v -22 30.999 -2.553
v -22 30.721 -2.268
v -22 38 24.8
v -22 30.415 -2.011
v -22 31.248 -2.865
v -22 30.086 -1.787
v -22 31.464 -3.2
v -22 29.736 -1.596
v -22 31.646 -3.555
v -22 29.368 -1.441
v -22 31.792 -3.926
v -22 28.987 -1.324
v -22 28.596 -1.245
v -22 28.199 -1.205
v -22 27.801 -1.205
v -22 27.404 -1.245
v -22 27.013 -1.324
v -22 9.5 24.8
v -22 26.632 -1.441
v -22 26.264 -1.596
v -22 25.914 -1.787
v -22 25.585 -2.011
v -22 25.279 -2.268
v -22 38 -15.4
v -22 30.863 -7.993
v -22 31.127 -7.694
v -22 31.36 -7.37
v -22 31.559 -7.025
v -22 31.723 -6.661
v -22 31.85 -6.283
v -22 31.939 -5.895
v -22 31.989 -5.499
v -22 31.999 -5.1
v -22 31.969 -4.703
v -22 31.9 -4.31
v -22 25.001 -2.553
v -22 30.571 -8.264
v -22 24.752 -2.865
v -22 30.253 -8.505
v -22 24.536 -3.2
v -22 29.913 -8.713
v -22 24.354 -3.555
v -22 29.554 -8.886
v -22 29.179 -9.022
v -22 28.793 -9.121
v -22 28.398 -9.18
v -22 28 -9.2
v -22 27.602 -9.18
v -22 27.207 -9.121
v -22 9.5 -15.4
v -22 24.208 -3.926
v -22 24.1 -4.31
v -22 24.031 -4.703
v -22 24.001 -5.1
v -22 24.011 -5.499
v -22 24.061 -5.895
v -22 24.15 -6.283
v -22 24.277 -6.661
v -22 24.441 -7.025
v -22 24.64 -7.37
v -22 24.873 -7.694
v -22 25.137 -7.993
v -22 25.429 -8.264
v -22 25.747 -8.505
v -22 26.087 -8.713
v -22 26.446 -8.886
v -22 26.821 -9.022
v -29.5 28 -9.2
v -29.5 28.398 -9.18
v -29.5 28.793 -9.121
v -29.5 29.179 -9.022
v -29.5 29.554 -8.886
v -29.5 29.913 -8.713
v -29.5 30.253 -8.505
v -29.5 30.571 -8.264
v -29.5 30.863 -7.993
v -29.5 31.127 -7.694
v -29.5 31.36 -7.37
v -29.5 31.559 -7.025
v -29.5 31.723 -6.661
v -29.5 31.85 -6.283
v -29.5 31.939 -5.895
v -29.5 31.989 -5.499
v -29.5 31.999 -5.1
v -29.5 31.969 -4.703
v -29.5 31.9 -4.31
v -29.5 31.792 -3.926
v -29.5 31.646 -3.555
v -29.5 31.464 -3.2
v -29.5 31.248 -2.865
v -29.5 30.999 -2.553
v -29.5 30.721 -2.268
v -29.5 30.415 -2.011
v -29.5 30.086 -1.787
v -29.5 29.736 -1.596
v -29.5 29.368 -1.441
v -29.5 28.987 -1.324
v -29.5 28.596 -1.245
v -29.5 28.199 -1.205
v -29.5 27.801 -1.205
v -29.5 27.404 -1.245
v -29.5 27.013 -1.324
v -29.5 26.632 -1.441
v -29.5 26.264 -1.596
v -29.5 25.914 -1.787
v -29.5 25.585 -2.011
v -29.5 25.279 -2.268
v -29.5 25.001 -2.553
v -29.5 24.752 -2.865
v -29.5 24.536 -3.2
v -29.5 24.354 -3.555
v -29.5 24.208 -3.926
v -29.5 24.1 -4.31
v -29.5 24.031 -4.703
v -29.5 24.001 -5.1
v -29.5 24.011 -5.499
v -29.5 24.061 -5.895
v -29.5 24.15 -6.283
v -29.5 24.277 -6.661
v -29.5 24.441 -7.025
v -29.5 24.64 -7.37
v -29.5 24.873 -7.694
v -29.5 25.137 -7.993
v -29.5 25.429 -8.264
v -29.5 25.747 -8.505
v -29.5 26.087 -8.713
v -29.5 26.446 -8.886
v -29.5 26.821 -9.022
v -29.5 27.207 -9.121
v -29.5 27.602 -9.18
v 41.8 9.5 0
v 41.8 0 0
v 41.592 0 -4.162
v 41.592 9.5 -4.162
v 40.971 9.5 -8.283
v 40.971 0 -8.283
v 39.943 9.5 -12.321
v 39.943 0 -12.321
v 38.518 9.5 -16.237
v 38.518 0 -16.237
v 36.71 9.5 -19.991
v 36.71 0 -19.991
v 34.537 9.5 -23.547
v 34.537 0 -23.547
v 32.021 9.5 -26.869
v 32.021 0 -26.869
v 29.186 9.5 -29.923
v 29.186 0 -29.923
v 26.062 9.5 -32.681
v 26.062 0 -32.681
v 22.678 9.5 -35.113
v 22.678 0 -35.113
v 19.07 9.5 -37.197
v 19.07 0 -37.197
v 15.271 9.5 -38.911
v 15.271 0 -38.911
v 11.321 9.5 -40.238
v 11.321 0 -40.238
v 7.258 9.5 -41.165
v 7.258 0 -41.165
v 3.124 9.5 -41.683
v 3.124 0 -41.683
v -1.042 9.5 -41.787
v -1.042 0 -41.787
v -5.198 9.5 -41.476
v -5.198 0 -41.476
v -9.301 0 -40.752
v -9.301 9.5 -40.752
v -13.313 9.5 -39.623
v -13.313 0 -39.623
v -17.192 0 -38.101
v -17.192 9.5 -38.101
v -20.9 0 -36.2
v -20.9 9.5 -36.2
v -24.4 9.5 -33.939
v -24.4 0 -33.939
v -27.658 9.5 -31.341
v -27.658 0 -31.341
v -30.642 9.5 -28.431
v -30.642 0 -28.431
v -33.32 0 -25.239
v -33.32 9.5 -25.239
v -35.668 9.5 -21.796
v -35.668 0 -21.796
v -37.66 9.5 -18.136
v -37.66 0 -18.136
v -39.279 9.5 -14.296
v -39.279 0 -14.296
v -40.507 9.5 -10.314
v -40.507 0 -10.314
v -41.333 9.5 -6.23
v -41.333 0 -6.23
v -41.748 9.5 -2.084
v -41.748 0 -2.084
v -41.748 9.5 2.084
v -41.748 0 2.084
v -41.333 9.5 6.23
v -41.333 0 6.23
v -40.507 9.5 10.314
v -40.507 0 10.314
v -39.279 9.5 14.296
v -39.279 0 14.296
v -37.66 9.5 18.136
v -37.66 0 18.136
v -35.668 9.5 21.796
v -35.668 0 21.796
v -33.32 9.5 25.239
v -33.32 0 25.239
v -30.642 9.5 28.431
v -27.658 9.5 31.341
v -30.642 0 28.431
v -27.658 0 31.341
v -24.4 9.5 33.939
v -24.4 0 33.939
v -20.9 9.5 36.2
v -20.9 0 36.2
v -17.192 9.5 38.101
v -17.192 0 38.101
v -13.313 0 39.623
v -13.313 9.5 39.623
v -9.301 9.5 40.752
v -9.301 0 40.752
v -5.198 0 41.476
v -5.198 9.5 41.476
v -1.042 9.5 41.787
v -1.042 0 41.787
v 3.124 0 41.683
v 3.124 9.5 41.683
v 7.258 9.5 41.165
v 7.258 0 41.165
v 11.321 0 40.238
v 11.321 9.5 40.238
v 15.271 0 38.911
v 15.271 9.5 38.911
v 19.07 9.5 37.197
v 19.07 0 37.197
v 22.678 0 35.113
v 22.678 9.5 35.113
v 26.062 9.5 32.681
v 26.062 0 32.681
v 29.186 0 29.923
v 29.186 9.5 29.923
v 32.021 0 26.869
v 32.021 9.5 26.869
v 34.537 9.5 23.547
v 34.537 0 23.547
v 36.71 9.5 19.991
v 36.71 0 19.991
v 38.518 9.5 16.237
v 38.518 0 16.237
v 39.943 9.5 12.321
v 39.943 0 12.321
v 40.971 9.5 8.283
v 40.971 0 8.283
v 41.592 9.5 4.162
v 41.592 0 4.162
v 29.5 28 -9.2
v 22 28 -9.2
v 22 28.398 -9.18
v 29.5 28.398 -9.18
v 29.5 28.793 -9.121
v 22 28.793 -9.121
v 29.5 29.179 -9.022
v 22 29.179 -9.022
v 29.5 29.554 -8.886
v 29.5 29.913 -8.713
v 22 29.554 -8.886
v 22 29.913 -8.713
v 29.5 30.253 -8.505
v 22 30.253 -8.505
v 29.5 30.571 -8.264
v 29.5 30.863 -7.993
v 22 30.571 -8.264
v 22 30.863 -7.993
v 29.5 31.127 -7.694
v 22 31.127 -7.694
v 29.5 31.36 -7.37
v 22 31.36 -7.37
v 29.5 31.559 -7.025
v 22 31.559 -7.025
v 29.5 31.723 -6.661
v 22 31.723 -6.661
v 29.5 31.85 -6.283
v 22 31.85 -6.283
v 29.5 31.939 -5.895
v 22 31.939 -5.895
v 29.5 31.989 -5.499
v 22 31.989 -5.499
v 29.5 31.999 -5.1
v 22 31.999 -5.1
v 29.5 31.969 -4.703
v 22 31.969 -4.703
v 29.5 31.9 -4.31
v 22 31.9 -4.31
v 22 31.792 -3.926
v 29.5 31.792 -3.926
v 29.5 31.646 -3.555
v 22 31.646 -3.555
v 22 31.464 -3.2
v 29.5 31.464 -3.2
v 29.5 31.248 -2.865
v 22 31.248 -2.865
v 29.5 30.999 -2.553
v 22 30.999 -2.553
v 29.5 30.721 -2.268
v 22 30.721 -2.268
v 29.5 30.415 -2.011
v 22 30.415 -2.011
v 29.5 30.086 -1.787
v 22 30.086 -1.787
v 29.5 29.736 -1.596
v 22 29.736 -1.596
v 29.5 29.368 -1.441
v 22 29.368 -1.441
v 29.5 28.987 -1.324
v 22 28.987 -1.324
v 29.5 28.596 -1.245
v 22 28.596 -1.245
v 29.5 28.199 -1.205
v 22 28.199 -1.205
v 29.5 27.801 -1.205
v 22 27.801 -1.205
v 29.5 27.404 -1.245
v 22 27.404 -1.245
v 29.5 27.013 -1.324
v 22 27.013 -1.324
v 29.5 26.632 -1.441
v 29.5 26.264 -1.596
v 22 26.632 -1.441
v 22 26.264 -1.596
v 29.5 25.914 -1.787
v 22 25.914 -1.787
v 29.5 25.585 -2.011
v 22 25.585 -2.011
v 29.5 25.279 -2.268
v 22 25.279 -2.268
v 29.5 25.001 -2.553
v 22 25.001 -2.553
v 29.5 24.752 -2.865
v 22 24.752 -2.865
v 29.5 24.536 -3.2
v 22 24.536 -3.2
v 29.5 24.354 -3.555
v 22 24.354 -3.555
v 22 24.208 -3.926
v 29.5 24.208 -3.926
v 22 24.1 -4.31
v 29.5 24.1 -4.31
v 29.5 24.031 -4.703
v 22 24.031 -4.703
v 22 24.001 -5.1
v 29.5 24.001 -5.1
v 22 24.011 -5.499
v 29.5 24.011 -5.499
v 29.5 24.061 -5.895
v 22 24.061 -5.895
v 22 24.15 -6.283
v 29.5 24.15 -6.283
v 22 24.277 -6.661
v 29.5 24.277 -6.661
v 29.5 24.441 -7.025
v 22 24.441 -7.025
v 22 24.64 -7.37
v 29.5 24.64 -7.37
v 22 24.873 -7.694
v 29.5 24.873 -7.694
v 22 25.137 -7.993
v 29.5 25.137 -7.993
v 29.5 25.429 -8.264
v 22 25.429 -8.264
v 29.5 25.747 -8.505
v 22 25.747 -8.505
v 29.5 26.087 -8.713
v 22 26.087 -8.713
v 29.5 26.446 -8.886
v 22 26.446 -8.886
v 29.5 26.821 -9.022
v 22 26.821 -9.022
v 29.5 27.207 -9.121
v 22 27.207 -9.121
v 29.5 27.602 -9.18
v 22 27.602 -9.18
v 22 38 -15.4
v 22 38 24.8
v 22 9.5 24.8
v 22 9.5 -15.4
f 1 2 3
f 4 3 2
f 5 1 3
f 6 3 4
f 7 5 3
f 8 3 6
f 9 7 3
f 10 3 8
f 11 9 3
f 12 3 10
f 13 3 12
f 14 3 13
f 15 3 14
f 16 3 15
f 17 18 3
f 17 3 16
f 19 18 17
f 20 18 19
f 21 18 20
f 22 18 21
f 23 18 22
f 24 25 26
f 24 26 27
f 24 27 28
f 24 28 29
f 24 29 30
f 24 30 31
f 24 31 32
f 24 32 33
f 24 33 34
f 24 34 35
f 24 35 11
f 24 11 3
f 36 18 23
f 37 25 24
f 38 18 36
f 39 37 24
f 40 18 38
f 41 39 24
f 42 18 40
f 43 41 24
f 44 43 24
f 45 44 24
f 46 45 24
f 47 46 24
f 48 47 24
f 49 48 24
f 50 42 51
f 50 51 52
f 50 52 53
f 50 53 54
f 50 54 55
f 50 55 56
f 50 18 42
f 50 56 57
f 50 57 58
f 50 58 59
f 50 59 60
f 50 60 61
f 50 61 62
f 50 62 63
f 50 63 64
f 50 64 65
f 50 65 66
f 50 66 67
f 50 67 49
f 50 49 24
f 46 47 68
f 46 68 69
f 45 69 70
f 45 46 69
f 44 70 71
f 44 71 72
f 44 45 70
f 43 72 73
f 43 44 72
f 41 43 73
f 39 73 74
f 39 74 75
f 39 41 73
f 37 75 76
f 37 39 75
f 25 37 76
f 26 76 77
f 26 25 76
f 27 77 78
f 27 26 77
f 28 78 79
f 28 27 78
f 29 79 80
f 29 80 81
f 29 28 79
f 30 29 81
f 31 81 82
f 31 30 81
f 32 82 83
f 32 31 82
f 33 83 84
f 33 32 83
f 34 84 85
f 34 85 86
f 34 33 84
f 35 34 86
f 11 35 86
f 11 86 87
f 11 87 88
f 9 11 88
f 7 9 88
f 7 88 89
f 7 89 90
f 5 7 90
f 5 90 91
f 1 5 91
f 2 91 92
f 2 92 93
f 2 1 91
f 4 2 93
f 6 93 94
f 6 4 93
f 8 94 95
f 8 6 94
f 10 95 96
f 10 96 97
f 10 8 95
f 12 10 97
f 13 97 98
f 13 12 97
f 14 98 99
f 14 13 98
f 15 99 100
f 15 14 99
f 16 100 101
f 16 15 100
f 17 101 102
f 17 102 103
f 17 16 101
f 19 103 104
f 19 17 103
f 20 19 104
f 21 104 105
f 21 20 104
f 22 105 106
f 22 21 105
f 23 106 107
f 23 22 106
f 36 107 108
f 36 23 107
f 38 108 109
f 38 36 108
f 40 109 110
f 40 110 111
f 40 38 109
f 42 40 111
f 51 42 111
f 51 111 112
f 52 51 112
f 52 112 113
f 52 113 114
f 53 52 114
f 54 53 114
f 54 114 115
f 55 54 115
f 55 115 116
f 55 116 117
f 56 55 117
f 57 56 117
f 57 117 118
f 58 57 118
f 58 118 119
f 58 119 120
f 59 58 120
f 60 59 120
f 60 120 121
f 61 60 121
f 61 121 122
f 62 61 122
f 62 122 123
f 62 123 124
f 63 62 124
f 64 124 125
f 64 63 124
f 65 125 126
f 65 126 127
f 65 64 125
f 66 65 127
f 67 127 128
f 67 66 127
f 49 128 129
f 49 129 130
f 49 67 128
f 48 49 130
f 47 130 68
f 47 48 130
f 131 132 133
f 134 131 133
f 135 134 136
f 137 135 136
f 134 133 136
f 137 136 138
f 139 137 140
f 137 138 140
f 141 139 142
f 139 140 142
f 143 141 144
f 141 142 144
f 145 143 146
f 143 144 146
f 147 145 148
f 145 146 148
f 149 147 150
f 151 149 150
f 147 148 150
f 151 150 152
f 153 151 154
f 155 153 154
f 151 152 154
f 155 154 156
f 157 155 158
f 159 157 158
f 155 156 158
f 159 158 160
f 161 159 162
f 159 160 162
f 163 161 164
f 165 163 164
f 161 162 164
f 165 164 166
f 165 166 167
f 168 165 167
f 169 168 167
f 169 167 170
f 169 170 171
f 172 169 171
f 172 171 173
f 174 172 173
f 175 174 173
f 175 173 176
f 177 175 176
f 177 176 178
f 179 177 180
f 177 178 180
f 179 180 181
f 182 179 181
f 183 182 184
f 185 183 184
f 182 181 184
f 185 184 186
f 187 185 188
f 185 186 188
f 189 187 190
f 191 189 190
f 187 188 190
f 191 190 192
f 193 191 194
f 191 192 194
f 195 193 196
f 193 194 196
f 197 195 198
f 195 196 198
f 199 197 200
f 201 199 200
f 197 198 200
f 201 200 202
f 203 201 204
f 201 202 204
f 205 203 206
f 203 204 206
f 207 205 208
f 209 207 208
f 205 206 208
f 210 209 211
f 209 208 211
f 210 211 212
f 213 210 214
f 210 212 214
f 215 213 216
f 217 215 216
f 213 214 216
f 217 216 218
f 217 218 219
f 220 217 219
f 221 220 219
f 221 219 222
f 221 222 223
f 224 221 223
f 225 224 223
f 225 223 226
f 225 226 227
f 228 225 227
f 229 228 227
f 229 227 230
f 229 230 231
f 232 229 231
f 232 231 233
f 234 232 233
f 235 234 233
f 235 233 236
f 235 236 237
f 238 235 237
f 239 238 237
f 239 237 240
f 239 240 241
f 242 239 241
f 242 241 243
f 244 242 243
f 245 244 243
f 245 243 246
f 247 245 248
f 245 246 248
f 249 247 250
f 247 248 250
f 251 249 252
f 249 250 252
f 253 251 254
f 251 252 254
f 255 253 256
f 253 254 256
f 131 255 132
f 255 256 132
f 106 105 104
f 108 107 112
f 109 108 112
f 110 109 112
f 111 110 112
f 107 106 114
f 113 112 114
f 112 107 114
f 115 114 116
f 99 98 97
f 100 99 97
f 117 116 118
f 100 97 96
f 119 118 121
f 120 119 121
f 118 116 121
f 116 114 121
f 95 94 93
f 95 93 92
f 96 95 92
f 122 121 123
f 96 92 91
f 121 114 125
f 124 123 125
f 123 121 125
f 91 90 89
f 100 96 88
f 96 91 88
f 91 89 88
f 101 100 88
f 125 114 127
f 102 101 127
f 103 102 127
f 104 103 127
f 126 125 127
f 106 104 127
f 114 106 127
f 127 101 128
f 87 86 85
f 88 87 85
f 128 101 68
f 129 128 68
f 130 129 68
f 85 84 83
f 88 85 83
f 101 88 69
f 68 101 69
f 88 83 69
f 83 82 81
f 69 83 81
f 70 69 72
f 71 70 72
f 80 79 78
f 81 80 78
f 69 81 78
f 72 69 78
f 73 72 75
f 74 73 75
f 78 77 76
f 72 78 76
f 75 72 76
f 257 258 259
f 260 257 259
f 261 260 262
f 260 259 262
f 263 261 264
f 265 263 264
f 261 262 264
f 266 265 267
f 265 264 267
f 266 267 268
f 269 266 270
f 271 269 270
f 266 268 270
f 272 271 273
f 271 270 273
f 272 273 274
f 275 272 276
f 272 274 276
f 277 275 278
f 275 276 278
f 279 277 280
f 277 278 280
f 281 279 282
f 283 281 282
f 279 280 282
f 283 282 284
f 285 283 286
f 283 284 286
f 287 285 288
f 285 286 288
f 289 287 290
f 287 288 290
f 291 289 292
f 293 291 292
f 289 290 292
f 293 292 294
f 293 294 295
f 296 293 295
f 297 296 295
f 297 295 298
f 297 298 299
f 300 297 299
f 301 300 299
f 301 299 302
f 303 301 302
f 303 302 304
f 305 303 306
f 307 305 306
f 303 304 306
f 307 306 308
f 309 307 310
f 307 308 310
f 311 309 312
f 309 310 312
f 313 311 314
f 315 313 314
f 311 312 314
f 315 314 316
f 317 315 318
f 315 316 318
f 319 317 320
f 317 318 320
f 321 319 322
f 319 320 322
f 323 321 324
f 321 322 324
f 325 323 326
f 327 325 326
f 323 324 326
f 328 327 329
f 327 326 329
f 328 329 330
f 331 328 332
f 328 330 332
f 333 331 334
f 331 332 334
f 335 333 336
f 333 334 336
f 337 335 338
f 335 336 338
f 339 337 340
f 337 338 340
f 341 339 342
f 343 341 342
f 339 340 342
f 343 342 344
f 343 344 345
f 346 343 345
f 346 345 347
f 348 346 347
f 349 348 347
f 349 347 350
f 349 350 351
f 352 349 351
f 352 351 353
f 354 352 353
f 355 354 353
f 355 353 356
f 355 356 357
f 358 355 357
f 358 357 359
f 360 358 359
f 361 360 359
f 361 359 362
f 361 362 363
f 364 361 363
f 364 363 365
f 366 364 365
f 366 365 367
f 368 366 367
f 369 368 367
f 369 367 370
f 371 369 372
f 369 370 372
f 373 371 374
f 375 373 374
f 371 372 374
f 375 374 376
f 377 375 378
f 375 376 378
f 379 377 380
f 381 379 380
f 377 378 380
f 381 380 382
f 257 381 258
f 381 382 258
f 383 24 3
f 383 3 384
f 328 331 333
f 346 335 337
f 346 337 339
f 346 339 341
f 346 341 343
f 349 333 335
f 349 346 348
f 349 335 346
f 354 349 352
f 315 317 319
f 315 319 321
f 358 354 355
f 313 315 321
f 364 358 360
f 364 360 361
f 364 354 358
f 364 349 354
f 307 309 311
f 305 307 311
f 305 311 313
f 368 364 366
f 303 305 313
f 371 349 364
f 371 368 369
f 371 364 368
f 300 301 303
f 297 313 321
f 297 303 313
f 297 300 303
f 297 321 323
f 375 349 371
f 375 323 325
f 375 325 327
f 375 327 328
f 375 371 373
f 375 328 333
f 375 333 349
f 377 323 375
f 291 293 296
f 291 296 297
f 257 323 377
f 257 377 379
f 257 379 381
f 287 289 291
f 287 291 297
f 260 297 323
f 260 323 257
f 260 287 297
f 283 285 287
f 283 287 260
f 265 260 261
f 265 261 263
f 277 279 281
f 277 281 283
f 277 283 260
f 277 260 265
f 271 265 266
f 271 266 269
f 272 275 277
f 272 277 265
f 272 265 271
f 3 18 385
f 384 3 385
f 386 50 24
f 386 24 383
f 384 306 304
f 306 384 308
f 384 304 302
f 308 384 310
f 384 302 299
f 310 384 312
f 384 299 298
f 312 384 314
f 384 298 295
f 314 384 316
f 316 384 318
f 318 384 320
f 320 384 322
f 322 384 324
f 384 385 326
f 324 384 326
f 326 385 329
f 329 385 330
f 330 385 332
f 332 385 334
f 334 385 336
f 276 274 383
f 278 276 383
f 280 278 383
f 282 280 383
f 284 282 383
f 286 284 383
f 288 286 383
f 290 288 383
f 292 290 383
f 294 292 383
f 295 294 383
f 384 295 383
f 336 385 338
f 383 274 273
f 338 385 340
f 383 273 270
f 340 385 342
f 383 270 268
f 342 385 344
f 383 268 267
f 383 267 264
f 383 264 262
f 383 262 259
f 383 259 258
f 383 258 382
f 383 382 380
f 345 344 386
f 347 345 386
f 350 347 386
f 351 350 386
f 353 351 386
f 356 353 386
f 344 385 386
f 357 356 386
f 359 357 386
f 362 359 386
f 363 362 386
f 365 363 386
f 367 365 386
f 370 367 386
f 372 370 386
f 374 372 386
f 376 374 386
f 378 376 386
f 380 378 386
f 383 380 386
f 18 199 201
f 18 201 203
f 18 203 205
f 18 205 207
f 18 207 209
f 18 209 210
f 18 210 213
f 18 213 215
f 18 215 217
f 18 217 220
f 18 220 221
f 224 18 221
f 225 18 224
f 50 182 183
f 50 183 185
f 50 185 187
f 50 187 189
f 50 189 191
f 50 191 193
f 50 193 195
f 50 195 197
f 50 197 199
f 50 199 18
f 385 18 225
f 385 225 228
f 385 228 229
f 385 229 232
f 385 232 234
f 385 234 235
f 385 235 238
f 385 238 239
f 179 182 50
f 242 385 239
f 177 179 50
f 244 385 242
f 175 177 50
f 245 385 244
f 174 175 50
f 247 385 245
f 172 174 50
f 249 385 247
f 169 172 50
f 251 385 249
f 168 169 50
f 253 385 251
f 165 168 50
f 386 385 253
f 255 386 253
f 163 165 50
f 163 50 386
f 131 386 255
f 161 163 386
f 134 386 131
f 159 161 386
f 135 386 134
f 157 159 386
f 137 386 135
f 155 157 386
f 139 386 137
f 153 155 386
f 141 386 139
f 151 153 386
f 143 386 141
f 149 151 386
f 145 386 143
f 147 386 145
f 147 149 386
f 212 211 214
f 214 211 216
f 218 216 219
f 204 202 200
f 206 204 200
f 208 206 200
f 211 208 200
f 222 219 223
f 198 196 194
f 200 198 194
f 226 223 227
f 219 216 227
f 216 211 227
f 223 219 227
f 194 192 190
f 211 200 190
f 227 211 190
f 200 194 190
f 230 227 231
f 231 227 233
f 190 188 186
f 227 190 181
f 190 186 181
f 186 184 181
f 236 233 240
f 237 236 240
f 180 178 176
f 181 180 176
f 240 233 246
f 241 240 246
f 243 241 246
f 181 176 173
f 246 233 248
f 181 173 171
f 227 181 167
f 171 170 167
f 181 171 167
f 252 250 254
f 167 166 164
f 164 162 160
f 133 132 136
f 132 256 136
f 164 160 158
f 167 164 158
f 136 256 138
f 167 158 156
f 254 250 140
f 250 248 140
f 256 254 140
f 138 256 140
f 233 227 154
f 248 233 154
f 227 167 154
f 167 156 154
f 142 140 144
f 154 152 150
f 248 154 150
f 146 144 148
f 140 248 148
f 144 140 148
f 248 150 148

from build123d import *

# Parameters (mm, degrees)
SKETCH1_R           = 41.8
BOSS_EXTRUDE1_DEPTH = 9.5
SKETCH2_W           = 44
SKETCH2_H           = 40.2
BOSS_EXTRUDE2_DEPTH = 28.5
SKETCH3_R           = 4
BOSS_EXTRUDE3_DEPTH = 7.5


with BuildPart() as part:
    # Sketch1 → Boss-Extrude1 (new body)
    with BuildSketch(Plane(origin=(0, 0, 0), x_dir=(1, 0, 0), z_dir=(0, 1, 0))):
        Circle(SKETCH1_R)
    extrude(amount=BOSS_EXTRUDE1_DEPTH)

    # Sketch2 → Boss-Extrude2 (add)
    with BuildSketch(Plane(origin=(0, 9.5, 0), x_dir=(1, 0, 0), z_dir=(0, 1, 0))):
        with Locations((0, -4.7)):
            Rectangle(SKETCH2_W, SKETCH2_H)
    extrude(amount=BOSS_EXTRUDE2_DEPTH)

    # Sketch3 → Boss-Extrude3 (add)
    with BuildSketch(Plane(origin=(22, 0, 0), x_dir=(0, 0, -1), z_dir=(1, 0, 0))):
        with Locations((5.2, 28)):
            Circle(SKETCH3_R)
    boss_extrude3 = extrude(amount=BOSS_EXTRUDE3_DEPTH)

    # Mirror2: Boss-Extrude3 across plane
    add(boss_extrude3.mirror(Plane(origin=(0, 0, 0), x_dir=(0, 0, 1), z_dir=(1, 0, 0))))


solid = part.part
